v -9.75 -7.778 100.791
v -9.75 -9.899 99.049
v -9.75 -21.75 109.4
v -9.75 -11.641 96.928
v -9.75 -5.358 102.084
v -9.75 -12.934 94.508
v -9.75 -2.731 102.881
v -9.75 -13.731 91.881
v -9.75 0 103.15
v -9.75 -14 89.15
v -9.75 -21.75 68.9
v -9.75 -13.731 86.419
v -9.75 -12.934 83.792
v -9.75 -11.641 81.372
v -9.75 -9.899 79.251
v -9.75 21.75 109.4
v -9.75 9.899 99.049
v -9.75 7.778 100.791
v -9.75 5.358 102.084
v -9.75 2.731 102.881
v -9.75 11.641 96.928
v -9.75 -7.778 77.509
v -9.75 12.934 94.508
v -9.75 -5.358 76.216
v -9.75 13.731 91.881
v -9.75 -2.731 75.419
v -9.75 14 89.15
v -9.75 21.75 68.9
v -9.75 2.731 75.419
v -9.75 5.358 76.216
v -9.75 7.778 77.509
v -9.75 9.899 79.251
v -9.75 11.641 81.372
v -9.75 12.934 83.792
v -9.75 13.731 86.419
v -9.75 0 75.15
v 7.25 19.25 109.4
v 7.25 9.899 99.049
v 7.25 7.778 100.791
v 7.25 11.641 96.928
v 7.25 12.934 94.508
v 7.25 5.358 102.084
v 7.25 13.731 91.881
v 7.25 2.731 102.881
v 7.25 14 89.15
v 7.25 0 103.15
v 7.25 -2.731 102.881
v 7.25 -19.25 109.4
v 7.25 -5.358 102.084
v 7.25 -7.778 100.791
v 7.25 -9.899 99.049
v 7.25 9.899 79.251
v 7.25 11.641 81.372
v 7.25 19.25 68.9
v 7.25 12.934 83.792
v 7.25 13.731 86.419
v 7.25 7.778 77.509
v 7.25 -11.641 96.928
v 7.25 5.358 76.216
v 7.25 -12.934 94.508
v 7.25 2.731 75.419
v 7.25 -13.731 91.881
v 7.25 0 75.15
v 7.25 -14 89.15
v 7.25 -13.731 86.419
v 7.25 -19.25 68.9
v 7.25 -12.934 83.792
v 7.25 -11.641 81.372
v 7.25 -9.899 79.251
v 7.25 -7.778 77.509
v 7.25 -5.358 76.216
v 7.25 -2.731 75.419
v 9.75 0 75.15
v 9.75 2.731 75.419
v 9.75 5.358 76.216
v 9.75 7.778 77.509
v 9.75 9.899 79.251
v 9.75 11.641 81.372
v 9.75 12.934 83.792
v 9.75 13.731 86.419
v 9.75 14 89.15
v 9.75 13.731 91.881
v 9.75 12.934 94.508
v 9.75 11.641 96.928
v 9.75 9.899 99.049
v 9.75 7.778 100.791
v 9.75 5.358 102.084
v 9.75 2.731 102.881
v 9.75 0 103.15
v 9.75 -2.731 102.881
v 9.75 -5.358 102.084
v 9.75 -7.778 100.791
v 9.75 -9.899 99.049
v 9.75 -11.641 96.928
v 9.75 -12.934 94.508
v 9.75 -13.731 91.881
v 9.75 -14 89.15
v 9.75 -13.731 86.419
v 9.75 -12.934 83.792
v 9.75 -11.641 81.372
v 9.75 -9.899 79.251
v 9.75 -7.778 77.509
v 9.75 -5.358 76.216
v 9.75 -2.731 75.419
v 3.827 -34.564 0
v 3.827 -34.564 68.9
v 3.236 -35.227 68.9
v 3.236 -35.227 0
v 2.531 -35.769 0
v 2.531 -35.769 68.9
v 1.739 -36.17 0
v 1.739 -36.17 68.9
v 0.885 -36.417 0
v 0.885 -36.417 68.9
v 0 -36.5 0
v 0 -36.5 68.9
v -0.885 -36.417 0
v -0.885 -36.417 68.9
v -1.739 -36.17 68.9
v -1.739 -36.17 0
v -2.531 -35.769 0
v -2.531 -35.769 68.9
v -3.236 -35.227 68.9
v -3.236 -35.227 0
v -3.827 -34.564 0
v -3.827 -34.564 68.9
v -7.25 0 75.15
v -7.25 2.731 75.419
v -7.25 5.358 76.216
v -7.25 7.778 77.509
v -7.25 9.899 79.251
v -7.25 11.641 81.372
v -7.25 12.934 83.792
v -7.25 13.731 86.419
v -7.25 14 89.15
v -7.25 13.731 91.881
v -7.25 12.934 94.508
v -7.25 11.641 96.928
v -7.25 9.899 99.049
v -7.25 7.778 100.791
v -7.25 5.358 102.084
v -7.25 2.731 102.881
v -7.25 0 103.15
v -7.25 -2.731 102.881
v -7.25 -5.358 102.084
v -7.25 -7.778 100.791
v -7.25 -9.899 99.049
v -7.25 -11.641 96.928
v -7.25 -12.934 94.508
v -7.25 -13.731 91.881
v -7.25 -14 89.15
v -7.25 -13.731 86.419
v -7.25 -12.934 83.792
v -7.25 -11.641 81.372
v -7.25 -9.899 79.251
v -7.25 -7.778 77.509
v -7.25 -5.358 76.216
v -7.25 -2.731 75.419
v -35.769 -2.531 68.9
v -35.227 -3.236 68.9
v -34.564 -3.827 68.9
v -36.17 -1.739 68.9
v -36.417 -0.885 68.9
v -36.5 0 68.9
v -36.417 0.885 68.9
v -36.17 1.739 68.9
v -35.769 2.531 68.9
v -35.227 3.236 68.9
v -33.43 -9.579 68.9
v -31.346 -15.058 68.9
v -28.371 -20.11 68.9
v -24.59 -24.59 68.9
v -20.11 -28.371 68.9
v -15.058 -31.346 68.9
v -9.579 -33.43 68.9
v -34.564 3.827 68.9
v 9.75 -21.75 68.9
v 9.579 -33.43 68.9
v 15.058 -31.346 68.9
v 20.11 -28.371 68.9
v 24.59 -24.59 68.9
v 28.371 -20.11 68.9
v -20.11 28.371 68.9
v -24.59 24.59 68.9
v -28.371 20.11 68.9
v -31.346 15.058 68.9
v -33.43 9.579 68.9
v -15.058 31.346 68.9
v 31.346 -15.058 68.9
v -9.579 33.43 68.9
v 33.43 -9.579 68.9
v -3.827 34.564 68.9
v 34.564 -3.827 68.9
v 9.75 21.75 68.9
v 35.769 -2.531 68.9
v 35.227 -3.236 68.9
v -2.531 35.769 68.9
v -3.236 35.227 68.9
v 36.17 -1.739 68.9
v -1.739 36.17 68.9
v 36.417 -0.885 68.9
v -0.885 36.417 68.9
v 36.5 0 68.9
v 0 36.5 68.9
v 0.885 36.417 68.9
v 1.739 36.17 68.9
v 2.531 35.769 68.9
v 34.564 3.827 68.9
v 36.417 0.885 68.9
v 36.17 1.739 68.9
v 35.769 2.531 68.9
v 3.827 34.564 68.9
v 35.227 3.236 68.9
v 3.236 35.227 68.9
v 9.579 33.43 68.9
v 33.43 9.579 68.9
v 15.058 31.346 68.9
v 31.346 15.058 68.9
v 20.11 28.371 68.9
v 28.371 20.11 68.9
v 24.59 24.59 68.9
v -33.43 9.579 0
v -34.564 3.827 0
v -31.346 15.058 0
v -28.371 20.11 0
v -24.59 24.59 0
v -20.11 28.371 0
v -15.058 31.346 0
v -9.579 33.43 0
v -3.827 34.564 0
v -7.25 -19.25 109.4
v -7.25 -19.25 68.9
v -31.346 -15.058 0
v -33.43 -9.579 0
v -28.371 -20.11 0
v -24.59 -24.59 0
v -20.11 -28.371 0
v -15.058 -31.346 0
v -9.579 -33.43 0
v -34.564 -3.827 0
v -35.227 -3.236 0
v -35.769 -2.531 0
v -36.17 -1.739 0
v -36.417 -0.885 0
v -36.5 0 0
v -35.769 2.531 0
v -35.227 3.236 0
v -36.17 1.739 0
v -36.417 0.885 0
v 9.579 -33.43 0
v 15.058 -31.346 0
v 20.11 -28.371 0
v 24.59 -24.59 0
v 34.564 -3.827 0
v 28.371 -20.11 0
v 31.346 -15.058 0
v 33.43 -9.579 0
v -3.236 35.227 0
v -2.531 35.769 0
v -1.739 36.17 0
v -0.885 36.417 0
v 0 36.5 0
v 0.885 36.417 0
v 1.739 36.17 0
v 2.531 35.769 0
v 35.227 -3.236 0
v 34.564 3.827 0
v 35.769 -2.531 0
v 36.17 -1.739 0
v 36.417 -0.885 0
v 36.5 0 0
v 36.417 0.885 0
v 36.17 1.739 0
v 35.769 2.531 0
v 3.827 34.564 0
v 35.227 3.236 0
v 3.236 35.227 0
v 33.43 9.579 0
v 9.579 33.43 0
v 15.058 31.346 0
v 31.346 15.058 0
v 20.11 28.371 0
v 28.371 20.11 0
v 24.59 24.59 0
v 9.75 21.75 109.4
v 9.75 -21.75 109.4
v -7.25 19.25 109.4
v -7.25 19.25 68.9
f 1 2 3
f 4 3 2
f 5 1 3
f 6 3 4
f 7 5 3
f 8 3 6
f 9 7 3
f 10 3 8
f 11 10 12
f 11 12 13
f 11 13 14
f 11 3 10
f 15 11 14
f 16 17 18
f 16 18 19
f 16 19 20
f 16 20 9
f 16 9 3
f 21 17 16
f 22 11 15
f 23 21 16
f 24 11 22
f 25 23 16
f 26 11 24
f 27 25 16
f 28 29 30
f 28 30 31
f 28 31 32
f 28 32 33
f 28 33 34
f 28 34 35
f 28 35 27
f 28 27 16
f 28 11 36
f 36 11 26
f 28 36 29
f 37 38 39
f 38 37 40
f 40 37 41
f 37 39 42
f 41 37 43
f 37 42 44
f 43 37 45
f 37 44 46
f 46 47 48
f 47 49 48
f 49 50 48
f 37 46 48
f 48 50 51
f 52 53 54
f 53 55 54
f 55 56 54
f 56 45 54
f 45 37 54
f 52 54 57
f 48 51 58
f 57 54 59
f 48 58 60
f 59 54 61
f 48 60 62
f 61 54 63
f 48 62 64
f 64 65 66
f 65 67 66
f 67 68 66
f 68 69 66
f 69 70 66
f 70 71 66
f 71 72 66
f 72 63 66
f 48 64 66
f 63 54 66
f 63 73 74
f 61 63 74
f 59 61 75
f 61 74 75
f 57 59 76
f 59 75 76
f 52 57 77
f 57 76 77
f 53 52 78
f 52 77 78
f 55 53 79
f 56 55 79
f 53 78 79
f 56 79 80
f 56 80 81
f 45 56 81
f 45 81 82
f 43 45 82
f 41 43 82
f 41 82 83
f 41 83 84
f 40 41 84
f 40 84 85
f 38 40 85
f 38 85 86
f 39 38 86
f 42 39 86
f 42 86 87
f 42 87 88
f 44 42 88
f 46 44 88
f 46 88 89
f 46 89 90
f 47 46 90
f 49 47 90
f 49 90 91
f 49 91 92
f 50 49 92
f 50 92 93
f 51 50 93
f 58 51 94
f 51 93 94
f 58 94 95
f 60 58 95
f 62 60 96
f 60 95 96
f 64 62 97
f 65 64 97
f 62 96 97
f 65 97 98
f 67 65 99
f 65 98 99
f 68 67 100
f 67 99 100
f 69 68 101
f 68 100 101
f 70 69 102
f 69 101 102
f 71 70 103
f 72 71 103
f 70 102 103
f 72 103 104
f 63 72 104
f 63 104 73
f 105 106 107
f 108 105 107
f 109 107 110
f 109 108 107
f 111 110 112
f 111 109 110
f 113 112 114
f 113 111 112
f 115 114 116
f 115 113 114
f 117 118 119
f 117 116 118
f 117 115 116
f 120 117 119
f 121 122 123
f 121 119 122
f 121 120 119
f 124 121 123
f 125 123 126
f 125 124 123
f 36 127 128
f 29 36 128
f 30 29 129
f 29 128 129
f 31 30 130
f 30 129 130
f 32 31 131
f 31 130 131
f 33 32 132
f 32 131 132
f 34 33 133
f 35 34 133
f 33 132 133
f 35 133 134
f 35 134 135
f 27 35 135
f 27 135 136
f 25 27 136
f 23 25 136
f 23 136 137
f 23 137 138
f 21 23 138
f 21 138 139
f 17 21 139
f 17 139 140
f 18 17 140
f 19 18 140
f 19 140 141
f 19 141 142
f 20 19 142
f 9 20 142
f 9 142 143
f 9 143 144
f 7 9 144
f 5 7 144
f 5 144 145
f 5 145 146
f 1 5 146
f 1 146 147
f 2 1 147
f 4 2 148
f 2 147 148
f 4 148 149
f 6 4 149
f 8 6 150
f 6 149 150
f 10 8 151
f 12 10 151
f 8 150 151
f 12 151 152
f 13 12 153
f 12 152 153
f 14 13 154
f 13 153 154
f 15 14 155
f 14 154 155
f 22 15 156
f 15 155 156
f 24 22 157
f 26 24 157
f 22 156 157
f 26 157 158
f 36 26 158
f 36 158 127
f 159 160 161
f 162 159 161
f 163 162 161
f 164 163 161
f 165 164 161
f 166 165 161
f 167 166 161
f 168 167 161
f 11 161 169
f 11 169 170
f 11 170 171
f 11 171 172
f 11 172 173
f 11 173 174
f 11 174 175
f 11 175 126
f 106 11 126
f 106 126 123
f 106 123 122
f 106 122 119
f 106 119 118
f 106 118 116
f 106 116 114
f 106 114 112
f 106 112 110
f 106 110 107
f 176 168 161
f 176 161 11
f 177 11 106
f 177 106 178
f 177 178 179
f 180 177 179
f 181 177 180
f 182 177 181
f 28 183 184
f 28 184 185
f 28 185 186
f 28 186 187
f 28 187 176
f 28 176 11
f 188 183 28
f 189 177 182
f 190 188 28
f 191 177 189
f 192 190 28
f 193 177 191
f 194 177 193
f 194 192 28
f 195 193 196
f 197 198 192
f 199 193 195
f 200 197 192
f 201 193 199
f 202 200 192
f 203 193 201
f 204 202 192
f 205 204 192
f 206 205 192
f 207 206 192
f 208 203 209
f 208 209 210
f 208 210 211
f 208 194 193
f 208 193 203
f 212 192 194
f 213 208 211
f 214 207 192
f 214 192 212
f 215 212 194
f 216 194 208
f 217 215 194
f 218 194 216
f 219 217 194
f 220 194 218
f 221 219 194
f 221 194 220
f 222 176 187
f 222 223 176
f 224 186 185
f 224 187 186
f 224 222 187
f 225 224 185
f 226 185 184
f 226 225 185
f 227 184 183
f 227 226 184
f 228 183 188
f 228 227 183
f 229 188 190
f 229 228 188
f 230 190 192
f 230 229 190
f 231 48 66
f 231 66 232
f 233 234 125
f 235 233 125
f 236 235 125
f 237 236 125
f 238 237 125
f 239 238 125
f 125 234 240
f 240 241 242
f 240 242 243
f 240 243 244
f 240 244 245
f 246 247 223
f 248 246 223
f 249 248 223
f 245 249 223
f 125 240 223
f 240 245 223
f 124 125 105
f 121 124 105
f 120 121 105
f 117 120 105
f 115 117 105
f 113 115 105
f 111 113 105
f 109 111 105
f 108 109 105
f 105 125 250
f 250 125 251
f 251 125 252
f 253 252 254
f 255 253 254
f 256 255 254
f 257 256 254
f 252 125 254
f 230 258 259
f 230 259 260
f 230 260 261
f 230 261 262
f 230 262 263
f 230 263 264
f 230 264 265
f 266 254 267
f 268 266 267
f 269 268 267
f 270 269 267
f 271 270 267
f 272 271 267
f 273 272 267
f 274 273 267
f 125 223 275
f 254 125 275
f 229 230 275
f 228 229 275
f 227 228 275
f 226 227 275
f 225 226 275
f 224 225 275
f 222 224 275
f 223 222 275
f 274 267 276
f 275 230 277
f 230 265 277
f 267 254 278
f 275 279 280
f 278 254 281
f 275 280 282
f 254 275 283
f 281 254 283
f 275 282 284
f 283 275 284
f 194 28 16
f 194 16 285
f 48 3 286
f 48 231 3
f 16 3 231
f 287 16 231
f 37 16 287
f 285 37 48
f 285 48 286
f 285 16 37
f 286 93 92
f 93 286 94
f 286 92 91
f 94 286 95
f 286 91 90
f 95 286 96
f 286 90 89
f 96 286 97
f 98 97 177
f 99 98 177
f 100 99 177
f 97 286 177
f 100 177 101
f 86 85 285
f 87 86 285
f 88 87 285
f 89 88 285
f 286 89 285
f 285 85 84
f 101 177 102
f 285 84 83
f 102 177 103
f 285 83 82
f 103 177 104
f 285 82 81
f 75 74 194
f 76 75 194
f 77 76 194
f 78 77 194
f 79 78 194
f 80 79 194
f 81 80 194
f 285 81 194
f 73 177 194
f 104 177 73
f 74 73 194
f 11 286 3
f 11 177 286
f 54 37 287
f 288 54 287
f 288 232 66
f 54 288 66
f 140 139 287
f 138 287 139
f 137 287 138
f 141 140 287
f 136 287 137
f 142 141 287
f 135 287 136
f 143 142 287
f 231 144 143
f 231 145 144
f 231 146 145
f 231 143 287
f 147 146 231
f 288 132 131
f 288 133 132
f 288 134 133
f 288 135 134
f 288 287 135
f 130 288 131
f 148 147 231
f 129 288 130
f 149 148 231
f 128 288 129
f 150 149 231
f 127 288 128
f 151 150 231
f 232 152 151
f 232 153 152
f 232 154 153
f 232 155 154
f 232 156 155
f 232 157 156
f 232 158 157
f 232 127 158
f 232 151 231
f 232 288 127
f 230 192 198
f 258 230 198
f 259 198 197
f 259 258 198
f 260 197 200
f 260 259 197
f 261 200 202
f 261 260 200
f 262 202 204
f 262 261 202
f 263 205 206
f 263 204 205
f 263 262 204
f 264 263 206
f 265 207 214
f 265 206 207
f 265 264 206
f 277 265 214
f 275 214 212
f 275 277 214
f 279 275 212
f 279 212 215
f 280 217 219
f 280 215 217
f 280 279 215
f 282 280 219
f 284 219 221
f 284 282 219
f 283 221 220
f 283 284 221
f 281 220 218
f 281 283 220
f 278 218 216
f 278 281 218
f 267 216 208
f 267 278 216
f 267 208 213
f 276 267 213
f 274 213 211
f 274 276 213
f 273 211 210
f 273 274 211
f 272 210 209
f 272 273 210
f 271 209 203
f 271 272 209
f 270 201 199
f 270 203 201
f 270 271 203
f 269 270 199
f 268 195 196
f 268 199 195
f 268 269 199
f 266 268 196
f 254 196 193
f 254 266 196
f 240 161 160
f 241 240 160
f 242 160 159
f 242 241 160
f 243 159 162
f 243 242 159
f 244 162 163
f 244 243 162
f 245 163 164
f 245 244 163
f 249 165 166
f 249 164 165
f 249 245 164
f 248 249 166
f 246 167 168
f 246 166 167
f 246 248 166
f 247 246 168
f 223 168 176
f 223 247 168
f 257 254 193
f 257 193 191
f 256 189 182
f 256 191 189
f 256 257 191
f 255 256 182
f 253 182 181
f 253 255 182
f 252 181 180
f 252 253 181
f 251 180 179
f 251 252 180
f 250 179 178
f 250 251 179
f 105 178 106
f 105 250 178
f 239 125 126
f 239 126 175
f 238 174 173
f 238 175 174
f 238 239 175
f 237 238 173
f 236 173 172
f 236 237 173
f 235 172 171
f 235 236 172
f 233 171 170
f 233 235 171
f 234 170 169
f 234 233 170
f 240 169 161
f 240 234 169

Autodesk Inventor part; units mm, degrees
ref_plane "YZ Plane" through (0, 0, 0) normal (1, 0, 0) x (0, 1, 0)
ref_plane "XZ Plane" through (0, 0, 0) normal (0, 1, 0) x (-1, 0, 0)
ref_plane "XY Plane" through (0, 0, 0) normal (0, 0, 1) x (1, 0, 0)
sketch "Sketch1" plane through (0, 0, 0) normal (0, 0, 1) x (1, 0, 0)
  circle A0 centre (0, 0) radius 11.25
  circle A1 centre (0, 0) radius 35.025
  circle A2 centre (0, 0) radius 37.030393
  arc A3 (-32.79294, -17.200962) -> (-31.29294, -19.799038) centre (0, 0) ccw
  line L0 (-32.79294, -17.200962) -> (-31.05471, -16.197395)
  line L1 (-32.79294, -17.200962) -> (-31.05471, -16.197395)
  line L2 (-29.55471, -18.795471) -> (-31.29294, -19.799038)
  line L3 (-31.29294, -19.799038) -> (-29.55471, -18.795471)
  line L4 (-16.197395, -31.05471) -> (-17.200962, -32.79294)
  line L5 (-17.200962, -32.79294) -> (-16.197395, -31.05471)
  arc A4 (-19.799038, -31.29294) -> (-17.200962, -32.79294) centre (0, 0) ccw
  line L6 (-19.799038, -31.29294) -> (-18.795471, -29.55471)
  line L7 (-19.799038, -31.29294) -> (-18.795471, -29.55471)
  arc A5 (17.200962, -32.79294) -> (19.799038, -31.29294) centre (0, 0) ccw
  line L8 (17.200962, -32.79294) -> (16.197395, -31.05471)
  line L9 (17.200962, -32.79294) -> (16.197395, -31.05471)
  line L10 (18.795471, -29.55471) -> (19.799038, -31.29294)
  line L11 (19.799038, -31.29294) -> (18.795471, -29.55471)
  arc A6 (31.29294, -19.799038) -> (32.79294, -17.200962) centre (0, 0) ccw
  line L12 (31.29294, -19.799038) -> (29.55471, -18.795471)
  line L13 (31.05471, -16.197395) -> (32.79294, -17.200962)
  line L14 (32.79294, -17.200962) -> (31.05471, -16.197395)
  line L15 (32.79294, 17.200962) -> (31.05471, 16.197395)
  line L16 (32.79294, 17.200962) -> (31.05471, 16.197395)
  arc A7 (32.79294, 17.200962) -> (31.29294, 19.799038) centre (0, 0) ccw
  line L17 (29.55471, 18.795471) -> (31.29294, 19.799038)
  line L18 (31.29294, 19.799038) -> (29.55471, 18.795471)
  line L19 (16.197395, 31.05471) -> (17.200962, 32.79294)
  line L20 (17.200962, 32.79294) -> (16.197395, 31.05471)
  line L21 (19.799038, 31.29294) -> (18.795471, 29.55471)
  line L22 (19.799038, 31.29294) -> (18.795471, 29.55471)
  line L23 (-17.200962, 32.79294) -> (-16.197395, 31.05471)
  line L24 (-17.200962, 32.79294) -> (-16.197395, 31.05471)
  line L25 (-18.795471, 29.55471) -> (-19.799038, 31.29294)
  line L26 (-19.799038, 31.29294) -> (-18.795471, 29.55471)
  arc A8 (-31.29294, 19.799038) -> (-32.79294, 17.200962) centre (0, 0) ccw
  line L27 (-31.29294, 19.799038) -> (-29.55471, 18.795471)
  line L28 (-31.29294, 19.799038) -> (-29.55471, 18.795471)
  line L29 (-31.05471, 16.197395) -> (-32.79294, 17.200962)
  line L30 (-32.79294, 17.200962) -> (-31.05471, 16.197395)
  arc A9 (-34.800207, -3.961848) -> (-34.800207, 3.961848) centre (-31.75, 0) ccw
  circle A10 centre (-31.75, 0) radius 5
  arc A11 (-3.961848, 34.800207) -> (3.961848, 34.800207) centre (0, 31.75) ccw
  circle A12 centre (0, 31.75) radius 5
  circle A13 centre (31.75, 0) radius 5
  circle A14 centre (31.75, 0) radius 5
  arc A15 (-3.961848, -34.800207) -> (3.961848, -34.800207) centre (0, -31.75) ccw
  circle A16 centre (0, -31.75) radius 5
  circle A17 centre (0, 31.75) radius 4.75
  circle A18 centre (-31.75, 0) radius 4.75
  circle A19 centre (0, -31.75) radius 4.75
  circle A20 centre (31.75, 0) radius 4.75
  circle A21 centre (0, 0) radius 34.775
  circle A22 centre (0, 0) radius 36.75
  point P0 (0, 0)
  point P1 (0, 49.75)
  point P2 (34.563789, -3.82689)
  point P3 (34.563789, 3.82689)
  point P4 (3.82689, 34.563789)
  point P5 (-3.82689, 34.563789)
  point P6 (-34.563789, 3.82689)
  point P7 (-34.563789, -3.82689)
  point P8 (-3.82689, -34.563789)
  point P9 (3.82689, -34.563789)
  dimension "d6" = 70.05
  dimension "d8" = 74.06079
  dimension "d0" = 10
  dimension "d1" = 0.25
  dimension "d4" = 360
  dimension "d7" = 0.25
  dimension "d9" = 73.5
sketch "Sketch1 outline for Extrusion1" plane through (0, 0, 0) normal (0, 0, 1) x (1, 0, 0)
  arc A0 (3.82689, -34.563789) -> (34.563789, -3.82689) centre (0, 0) ccw
  arc A1 (-3.82689, -34.563789) -> (3.82689, -34.563789) centre (0, -31.75) ccw
  arc A2 (-34.563789, -3.82689) -> (-3.82689, -34.563789) centre (0, 0) ccw
  arc A3 (-34.563789, 3.82689) -> (-34.563789, -3.82689) centre (-31.75, 0) ccw
  arc A4 (-3.82689, 34.563789) -> (-34.563789, 3.82689) centre (0, 0) ccw
  arc A5 (3.82689, 34.563789) -> (-3.82689, 34.563789) centre (0, 31.75) ccw
  arc A6 (34.563789, 3.82689) -> (3.82689, 34.563789) centre (0, 0) ccw
  arc A7 (34.563789, -3.82689) -> (34.563789, 3.82689) centre (31.75, 0) ccw
extrude "Extrusion1" add sketch "Sketch1 outline for Extrusion1" along normal blind 68.9
sketch "Skizze4" plane through (0, 0, 68.9) normal (0, 0, 1) x (1, 0, 0)
  line L0 (-9.75, 21.75) -> (9.75, 21.75) construction
  line L1 (9.75, 21.75) -> (9.75, -21.75) construction
  line L2 (9.75, -21.75) -> (-9.75, -21.75) construction
  line L3 (-9.75, -21.75) -> (-9.75, 21.75) construction
  line L4 (-9.75, 21.75) -> (9.75, -21.75) construction
  line L5 (9.75, 21.75) -> (-9.75, -21.75) construction
  line L6 (-9.75, 21.75) -> (-7.25, 21.75)
  line L7 (-7.25, 21.75) -> (-7.25, -21.75)
  line L8 (-7.25, -21.75) -> (-9.75, -21.75)
  line L9 (-9.75, -21.75) -> (-9.75, 21.75)
  line L10 (9.75, 21.75) -> (7.25, 21.75)
  line L11 (7.25, 21.75) -> (7.25, -21.75)
  line L12 (7.25, -21.75) -> (9.75, -21.75)
  line L13 (9.75, -21.75) -> (9.75, 21.75)
  line L14 (-7.25, -21.75) -> (8.25, -21.75)
  line L15 (8.25, -21.75) -> (8.25, -19.25)
  line L16 (8.25, -19.25) -> (-7.25, -19.25)
  line L17 (-7.25, -19.25) -> (-7.25, -21.75)
  line L18 (-7.25, 21.75) -> (8.25, 21.75)
  line L19 (8.25, 21.75) -> (8.25, 19.25)
  line L20 (8.25, 19.25) -> (-7.25, 19.25)
  line L21 (-7.25, 19.25) -> (-7.25, 21.75)
  point P0 (0, 0)
  point P1 (7.25, 19.25)
  point P2 (7.25, -19.25)
  dimension "d24" = 19.5
  dimension "d25" = 43.5
  dimension "d26" = 2.5
  dimension "d27" = 2.5
  dimension "d28" = 15.5
  dimension "d29" = 2.5
  dimension "d30" = 15.5
  dimension "d31" = 2.5
extrude "Extrusion4" add sketch "Skizze4" along normal blind 40.5 contours L6 L7 L8 L9 | L18 L11 L20 L7 | L10 L19 L20 L11 | L7 L16 L11 L14 | L20 L19 L10 L13 L12 L15 L16 L11 | L11 L16 L15 L12
sketch "Skizze5" plane through (9.75, -21.75, 68.9) normal (1, 0, 0) x (0, 0, -1)
  line L0 (-40.5, 43.5) -> (-40.5, 0) construction
  line L1 (0, 0) -> (-40.5, 0) construction
  line L2 (-40.5, 43.5) -> (0, 0) construction
  line L3 (0, 43.5) -> (-40.5, 43.5) construction
  line L4 (0, 43.5) -> (-40.5, 0) construction
  circle A0 centre (-20.25, 21.75) radius 14
  point P0 (68.9, 21.75)
  dimension "d35" = 28
extrude "Extrusion5" cut sketch "Skizze5" against normal through all
properties part number "power_sensor_aperture_V1.1"
